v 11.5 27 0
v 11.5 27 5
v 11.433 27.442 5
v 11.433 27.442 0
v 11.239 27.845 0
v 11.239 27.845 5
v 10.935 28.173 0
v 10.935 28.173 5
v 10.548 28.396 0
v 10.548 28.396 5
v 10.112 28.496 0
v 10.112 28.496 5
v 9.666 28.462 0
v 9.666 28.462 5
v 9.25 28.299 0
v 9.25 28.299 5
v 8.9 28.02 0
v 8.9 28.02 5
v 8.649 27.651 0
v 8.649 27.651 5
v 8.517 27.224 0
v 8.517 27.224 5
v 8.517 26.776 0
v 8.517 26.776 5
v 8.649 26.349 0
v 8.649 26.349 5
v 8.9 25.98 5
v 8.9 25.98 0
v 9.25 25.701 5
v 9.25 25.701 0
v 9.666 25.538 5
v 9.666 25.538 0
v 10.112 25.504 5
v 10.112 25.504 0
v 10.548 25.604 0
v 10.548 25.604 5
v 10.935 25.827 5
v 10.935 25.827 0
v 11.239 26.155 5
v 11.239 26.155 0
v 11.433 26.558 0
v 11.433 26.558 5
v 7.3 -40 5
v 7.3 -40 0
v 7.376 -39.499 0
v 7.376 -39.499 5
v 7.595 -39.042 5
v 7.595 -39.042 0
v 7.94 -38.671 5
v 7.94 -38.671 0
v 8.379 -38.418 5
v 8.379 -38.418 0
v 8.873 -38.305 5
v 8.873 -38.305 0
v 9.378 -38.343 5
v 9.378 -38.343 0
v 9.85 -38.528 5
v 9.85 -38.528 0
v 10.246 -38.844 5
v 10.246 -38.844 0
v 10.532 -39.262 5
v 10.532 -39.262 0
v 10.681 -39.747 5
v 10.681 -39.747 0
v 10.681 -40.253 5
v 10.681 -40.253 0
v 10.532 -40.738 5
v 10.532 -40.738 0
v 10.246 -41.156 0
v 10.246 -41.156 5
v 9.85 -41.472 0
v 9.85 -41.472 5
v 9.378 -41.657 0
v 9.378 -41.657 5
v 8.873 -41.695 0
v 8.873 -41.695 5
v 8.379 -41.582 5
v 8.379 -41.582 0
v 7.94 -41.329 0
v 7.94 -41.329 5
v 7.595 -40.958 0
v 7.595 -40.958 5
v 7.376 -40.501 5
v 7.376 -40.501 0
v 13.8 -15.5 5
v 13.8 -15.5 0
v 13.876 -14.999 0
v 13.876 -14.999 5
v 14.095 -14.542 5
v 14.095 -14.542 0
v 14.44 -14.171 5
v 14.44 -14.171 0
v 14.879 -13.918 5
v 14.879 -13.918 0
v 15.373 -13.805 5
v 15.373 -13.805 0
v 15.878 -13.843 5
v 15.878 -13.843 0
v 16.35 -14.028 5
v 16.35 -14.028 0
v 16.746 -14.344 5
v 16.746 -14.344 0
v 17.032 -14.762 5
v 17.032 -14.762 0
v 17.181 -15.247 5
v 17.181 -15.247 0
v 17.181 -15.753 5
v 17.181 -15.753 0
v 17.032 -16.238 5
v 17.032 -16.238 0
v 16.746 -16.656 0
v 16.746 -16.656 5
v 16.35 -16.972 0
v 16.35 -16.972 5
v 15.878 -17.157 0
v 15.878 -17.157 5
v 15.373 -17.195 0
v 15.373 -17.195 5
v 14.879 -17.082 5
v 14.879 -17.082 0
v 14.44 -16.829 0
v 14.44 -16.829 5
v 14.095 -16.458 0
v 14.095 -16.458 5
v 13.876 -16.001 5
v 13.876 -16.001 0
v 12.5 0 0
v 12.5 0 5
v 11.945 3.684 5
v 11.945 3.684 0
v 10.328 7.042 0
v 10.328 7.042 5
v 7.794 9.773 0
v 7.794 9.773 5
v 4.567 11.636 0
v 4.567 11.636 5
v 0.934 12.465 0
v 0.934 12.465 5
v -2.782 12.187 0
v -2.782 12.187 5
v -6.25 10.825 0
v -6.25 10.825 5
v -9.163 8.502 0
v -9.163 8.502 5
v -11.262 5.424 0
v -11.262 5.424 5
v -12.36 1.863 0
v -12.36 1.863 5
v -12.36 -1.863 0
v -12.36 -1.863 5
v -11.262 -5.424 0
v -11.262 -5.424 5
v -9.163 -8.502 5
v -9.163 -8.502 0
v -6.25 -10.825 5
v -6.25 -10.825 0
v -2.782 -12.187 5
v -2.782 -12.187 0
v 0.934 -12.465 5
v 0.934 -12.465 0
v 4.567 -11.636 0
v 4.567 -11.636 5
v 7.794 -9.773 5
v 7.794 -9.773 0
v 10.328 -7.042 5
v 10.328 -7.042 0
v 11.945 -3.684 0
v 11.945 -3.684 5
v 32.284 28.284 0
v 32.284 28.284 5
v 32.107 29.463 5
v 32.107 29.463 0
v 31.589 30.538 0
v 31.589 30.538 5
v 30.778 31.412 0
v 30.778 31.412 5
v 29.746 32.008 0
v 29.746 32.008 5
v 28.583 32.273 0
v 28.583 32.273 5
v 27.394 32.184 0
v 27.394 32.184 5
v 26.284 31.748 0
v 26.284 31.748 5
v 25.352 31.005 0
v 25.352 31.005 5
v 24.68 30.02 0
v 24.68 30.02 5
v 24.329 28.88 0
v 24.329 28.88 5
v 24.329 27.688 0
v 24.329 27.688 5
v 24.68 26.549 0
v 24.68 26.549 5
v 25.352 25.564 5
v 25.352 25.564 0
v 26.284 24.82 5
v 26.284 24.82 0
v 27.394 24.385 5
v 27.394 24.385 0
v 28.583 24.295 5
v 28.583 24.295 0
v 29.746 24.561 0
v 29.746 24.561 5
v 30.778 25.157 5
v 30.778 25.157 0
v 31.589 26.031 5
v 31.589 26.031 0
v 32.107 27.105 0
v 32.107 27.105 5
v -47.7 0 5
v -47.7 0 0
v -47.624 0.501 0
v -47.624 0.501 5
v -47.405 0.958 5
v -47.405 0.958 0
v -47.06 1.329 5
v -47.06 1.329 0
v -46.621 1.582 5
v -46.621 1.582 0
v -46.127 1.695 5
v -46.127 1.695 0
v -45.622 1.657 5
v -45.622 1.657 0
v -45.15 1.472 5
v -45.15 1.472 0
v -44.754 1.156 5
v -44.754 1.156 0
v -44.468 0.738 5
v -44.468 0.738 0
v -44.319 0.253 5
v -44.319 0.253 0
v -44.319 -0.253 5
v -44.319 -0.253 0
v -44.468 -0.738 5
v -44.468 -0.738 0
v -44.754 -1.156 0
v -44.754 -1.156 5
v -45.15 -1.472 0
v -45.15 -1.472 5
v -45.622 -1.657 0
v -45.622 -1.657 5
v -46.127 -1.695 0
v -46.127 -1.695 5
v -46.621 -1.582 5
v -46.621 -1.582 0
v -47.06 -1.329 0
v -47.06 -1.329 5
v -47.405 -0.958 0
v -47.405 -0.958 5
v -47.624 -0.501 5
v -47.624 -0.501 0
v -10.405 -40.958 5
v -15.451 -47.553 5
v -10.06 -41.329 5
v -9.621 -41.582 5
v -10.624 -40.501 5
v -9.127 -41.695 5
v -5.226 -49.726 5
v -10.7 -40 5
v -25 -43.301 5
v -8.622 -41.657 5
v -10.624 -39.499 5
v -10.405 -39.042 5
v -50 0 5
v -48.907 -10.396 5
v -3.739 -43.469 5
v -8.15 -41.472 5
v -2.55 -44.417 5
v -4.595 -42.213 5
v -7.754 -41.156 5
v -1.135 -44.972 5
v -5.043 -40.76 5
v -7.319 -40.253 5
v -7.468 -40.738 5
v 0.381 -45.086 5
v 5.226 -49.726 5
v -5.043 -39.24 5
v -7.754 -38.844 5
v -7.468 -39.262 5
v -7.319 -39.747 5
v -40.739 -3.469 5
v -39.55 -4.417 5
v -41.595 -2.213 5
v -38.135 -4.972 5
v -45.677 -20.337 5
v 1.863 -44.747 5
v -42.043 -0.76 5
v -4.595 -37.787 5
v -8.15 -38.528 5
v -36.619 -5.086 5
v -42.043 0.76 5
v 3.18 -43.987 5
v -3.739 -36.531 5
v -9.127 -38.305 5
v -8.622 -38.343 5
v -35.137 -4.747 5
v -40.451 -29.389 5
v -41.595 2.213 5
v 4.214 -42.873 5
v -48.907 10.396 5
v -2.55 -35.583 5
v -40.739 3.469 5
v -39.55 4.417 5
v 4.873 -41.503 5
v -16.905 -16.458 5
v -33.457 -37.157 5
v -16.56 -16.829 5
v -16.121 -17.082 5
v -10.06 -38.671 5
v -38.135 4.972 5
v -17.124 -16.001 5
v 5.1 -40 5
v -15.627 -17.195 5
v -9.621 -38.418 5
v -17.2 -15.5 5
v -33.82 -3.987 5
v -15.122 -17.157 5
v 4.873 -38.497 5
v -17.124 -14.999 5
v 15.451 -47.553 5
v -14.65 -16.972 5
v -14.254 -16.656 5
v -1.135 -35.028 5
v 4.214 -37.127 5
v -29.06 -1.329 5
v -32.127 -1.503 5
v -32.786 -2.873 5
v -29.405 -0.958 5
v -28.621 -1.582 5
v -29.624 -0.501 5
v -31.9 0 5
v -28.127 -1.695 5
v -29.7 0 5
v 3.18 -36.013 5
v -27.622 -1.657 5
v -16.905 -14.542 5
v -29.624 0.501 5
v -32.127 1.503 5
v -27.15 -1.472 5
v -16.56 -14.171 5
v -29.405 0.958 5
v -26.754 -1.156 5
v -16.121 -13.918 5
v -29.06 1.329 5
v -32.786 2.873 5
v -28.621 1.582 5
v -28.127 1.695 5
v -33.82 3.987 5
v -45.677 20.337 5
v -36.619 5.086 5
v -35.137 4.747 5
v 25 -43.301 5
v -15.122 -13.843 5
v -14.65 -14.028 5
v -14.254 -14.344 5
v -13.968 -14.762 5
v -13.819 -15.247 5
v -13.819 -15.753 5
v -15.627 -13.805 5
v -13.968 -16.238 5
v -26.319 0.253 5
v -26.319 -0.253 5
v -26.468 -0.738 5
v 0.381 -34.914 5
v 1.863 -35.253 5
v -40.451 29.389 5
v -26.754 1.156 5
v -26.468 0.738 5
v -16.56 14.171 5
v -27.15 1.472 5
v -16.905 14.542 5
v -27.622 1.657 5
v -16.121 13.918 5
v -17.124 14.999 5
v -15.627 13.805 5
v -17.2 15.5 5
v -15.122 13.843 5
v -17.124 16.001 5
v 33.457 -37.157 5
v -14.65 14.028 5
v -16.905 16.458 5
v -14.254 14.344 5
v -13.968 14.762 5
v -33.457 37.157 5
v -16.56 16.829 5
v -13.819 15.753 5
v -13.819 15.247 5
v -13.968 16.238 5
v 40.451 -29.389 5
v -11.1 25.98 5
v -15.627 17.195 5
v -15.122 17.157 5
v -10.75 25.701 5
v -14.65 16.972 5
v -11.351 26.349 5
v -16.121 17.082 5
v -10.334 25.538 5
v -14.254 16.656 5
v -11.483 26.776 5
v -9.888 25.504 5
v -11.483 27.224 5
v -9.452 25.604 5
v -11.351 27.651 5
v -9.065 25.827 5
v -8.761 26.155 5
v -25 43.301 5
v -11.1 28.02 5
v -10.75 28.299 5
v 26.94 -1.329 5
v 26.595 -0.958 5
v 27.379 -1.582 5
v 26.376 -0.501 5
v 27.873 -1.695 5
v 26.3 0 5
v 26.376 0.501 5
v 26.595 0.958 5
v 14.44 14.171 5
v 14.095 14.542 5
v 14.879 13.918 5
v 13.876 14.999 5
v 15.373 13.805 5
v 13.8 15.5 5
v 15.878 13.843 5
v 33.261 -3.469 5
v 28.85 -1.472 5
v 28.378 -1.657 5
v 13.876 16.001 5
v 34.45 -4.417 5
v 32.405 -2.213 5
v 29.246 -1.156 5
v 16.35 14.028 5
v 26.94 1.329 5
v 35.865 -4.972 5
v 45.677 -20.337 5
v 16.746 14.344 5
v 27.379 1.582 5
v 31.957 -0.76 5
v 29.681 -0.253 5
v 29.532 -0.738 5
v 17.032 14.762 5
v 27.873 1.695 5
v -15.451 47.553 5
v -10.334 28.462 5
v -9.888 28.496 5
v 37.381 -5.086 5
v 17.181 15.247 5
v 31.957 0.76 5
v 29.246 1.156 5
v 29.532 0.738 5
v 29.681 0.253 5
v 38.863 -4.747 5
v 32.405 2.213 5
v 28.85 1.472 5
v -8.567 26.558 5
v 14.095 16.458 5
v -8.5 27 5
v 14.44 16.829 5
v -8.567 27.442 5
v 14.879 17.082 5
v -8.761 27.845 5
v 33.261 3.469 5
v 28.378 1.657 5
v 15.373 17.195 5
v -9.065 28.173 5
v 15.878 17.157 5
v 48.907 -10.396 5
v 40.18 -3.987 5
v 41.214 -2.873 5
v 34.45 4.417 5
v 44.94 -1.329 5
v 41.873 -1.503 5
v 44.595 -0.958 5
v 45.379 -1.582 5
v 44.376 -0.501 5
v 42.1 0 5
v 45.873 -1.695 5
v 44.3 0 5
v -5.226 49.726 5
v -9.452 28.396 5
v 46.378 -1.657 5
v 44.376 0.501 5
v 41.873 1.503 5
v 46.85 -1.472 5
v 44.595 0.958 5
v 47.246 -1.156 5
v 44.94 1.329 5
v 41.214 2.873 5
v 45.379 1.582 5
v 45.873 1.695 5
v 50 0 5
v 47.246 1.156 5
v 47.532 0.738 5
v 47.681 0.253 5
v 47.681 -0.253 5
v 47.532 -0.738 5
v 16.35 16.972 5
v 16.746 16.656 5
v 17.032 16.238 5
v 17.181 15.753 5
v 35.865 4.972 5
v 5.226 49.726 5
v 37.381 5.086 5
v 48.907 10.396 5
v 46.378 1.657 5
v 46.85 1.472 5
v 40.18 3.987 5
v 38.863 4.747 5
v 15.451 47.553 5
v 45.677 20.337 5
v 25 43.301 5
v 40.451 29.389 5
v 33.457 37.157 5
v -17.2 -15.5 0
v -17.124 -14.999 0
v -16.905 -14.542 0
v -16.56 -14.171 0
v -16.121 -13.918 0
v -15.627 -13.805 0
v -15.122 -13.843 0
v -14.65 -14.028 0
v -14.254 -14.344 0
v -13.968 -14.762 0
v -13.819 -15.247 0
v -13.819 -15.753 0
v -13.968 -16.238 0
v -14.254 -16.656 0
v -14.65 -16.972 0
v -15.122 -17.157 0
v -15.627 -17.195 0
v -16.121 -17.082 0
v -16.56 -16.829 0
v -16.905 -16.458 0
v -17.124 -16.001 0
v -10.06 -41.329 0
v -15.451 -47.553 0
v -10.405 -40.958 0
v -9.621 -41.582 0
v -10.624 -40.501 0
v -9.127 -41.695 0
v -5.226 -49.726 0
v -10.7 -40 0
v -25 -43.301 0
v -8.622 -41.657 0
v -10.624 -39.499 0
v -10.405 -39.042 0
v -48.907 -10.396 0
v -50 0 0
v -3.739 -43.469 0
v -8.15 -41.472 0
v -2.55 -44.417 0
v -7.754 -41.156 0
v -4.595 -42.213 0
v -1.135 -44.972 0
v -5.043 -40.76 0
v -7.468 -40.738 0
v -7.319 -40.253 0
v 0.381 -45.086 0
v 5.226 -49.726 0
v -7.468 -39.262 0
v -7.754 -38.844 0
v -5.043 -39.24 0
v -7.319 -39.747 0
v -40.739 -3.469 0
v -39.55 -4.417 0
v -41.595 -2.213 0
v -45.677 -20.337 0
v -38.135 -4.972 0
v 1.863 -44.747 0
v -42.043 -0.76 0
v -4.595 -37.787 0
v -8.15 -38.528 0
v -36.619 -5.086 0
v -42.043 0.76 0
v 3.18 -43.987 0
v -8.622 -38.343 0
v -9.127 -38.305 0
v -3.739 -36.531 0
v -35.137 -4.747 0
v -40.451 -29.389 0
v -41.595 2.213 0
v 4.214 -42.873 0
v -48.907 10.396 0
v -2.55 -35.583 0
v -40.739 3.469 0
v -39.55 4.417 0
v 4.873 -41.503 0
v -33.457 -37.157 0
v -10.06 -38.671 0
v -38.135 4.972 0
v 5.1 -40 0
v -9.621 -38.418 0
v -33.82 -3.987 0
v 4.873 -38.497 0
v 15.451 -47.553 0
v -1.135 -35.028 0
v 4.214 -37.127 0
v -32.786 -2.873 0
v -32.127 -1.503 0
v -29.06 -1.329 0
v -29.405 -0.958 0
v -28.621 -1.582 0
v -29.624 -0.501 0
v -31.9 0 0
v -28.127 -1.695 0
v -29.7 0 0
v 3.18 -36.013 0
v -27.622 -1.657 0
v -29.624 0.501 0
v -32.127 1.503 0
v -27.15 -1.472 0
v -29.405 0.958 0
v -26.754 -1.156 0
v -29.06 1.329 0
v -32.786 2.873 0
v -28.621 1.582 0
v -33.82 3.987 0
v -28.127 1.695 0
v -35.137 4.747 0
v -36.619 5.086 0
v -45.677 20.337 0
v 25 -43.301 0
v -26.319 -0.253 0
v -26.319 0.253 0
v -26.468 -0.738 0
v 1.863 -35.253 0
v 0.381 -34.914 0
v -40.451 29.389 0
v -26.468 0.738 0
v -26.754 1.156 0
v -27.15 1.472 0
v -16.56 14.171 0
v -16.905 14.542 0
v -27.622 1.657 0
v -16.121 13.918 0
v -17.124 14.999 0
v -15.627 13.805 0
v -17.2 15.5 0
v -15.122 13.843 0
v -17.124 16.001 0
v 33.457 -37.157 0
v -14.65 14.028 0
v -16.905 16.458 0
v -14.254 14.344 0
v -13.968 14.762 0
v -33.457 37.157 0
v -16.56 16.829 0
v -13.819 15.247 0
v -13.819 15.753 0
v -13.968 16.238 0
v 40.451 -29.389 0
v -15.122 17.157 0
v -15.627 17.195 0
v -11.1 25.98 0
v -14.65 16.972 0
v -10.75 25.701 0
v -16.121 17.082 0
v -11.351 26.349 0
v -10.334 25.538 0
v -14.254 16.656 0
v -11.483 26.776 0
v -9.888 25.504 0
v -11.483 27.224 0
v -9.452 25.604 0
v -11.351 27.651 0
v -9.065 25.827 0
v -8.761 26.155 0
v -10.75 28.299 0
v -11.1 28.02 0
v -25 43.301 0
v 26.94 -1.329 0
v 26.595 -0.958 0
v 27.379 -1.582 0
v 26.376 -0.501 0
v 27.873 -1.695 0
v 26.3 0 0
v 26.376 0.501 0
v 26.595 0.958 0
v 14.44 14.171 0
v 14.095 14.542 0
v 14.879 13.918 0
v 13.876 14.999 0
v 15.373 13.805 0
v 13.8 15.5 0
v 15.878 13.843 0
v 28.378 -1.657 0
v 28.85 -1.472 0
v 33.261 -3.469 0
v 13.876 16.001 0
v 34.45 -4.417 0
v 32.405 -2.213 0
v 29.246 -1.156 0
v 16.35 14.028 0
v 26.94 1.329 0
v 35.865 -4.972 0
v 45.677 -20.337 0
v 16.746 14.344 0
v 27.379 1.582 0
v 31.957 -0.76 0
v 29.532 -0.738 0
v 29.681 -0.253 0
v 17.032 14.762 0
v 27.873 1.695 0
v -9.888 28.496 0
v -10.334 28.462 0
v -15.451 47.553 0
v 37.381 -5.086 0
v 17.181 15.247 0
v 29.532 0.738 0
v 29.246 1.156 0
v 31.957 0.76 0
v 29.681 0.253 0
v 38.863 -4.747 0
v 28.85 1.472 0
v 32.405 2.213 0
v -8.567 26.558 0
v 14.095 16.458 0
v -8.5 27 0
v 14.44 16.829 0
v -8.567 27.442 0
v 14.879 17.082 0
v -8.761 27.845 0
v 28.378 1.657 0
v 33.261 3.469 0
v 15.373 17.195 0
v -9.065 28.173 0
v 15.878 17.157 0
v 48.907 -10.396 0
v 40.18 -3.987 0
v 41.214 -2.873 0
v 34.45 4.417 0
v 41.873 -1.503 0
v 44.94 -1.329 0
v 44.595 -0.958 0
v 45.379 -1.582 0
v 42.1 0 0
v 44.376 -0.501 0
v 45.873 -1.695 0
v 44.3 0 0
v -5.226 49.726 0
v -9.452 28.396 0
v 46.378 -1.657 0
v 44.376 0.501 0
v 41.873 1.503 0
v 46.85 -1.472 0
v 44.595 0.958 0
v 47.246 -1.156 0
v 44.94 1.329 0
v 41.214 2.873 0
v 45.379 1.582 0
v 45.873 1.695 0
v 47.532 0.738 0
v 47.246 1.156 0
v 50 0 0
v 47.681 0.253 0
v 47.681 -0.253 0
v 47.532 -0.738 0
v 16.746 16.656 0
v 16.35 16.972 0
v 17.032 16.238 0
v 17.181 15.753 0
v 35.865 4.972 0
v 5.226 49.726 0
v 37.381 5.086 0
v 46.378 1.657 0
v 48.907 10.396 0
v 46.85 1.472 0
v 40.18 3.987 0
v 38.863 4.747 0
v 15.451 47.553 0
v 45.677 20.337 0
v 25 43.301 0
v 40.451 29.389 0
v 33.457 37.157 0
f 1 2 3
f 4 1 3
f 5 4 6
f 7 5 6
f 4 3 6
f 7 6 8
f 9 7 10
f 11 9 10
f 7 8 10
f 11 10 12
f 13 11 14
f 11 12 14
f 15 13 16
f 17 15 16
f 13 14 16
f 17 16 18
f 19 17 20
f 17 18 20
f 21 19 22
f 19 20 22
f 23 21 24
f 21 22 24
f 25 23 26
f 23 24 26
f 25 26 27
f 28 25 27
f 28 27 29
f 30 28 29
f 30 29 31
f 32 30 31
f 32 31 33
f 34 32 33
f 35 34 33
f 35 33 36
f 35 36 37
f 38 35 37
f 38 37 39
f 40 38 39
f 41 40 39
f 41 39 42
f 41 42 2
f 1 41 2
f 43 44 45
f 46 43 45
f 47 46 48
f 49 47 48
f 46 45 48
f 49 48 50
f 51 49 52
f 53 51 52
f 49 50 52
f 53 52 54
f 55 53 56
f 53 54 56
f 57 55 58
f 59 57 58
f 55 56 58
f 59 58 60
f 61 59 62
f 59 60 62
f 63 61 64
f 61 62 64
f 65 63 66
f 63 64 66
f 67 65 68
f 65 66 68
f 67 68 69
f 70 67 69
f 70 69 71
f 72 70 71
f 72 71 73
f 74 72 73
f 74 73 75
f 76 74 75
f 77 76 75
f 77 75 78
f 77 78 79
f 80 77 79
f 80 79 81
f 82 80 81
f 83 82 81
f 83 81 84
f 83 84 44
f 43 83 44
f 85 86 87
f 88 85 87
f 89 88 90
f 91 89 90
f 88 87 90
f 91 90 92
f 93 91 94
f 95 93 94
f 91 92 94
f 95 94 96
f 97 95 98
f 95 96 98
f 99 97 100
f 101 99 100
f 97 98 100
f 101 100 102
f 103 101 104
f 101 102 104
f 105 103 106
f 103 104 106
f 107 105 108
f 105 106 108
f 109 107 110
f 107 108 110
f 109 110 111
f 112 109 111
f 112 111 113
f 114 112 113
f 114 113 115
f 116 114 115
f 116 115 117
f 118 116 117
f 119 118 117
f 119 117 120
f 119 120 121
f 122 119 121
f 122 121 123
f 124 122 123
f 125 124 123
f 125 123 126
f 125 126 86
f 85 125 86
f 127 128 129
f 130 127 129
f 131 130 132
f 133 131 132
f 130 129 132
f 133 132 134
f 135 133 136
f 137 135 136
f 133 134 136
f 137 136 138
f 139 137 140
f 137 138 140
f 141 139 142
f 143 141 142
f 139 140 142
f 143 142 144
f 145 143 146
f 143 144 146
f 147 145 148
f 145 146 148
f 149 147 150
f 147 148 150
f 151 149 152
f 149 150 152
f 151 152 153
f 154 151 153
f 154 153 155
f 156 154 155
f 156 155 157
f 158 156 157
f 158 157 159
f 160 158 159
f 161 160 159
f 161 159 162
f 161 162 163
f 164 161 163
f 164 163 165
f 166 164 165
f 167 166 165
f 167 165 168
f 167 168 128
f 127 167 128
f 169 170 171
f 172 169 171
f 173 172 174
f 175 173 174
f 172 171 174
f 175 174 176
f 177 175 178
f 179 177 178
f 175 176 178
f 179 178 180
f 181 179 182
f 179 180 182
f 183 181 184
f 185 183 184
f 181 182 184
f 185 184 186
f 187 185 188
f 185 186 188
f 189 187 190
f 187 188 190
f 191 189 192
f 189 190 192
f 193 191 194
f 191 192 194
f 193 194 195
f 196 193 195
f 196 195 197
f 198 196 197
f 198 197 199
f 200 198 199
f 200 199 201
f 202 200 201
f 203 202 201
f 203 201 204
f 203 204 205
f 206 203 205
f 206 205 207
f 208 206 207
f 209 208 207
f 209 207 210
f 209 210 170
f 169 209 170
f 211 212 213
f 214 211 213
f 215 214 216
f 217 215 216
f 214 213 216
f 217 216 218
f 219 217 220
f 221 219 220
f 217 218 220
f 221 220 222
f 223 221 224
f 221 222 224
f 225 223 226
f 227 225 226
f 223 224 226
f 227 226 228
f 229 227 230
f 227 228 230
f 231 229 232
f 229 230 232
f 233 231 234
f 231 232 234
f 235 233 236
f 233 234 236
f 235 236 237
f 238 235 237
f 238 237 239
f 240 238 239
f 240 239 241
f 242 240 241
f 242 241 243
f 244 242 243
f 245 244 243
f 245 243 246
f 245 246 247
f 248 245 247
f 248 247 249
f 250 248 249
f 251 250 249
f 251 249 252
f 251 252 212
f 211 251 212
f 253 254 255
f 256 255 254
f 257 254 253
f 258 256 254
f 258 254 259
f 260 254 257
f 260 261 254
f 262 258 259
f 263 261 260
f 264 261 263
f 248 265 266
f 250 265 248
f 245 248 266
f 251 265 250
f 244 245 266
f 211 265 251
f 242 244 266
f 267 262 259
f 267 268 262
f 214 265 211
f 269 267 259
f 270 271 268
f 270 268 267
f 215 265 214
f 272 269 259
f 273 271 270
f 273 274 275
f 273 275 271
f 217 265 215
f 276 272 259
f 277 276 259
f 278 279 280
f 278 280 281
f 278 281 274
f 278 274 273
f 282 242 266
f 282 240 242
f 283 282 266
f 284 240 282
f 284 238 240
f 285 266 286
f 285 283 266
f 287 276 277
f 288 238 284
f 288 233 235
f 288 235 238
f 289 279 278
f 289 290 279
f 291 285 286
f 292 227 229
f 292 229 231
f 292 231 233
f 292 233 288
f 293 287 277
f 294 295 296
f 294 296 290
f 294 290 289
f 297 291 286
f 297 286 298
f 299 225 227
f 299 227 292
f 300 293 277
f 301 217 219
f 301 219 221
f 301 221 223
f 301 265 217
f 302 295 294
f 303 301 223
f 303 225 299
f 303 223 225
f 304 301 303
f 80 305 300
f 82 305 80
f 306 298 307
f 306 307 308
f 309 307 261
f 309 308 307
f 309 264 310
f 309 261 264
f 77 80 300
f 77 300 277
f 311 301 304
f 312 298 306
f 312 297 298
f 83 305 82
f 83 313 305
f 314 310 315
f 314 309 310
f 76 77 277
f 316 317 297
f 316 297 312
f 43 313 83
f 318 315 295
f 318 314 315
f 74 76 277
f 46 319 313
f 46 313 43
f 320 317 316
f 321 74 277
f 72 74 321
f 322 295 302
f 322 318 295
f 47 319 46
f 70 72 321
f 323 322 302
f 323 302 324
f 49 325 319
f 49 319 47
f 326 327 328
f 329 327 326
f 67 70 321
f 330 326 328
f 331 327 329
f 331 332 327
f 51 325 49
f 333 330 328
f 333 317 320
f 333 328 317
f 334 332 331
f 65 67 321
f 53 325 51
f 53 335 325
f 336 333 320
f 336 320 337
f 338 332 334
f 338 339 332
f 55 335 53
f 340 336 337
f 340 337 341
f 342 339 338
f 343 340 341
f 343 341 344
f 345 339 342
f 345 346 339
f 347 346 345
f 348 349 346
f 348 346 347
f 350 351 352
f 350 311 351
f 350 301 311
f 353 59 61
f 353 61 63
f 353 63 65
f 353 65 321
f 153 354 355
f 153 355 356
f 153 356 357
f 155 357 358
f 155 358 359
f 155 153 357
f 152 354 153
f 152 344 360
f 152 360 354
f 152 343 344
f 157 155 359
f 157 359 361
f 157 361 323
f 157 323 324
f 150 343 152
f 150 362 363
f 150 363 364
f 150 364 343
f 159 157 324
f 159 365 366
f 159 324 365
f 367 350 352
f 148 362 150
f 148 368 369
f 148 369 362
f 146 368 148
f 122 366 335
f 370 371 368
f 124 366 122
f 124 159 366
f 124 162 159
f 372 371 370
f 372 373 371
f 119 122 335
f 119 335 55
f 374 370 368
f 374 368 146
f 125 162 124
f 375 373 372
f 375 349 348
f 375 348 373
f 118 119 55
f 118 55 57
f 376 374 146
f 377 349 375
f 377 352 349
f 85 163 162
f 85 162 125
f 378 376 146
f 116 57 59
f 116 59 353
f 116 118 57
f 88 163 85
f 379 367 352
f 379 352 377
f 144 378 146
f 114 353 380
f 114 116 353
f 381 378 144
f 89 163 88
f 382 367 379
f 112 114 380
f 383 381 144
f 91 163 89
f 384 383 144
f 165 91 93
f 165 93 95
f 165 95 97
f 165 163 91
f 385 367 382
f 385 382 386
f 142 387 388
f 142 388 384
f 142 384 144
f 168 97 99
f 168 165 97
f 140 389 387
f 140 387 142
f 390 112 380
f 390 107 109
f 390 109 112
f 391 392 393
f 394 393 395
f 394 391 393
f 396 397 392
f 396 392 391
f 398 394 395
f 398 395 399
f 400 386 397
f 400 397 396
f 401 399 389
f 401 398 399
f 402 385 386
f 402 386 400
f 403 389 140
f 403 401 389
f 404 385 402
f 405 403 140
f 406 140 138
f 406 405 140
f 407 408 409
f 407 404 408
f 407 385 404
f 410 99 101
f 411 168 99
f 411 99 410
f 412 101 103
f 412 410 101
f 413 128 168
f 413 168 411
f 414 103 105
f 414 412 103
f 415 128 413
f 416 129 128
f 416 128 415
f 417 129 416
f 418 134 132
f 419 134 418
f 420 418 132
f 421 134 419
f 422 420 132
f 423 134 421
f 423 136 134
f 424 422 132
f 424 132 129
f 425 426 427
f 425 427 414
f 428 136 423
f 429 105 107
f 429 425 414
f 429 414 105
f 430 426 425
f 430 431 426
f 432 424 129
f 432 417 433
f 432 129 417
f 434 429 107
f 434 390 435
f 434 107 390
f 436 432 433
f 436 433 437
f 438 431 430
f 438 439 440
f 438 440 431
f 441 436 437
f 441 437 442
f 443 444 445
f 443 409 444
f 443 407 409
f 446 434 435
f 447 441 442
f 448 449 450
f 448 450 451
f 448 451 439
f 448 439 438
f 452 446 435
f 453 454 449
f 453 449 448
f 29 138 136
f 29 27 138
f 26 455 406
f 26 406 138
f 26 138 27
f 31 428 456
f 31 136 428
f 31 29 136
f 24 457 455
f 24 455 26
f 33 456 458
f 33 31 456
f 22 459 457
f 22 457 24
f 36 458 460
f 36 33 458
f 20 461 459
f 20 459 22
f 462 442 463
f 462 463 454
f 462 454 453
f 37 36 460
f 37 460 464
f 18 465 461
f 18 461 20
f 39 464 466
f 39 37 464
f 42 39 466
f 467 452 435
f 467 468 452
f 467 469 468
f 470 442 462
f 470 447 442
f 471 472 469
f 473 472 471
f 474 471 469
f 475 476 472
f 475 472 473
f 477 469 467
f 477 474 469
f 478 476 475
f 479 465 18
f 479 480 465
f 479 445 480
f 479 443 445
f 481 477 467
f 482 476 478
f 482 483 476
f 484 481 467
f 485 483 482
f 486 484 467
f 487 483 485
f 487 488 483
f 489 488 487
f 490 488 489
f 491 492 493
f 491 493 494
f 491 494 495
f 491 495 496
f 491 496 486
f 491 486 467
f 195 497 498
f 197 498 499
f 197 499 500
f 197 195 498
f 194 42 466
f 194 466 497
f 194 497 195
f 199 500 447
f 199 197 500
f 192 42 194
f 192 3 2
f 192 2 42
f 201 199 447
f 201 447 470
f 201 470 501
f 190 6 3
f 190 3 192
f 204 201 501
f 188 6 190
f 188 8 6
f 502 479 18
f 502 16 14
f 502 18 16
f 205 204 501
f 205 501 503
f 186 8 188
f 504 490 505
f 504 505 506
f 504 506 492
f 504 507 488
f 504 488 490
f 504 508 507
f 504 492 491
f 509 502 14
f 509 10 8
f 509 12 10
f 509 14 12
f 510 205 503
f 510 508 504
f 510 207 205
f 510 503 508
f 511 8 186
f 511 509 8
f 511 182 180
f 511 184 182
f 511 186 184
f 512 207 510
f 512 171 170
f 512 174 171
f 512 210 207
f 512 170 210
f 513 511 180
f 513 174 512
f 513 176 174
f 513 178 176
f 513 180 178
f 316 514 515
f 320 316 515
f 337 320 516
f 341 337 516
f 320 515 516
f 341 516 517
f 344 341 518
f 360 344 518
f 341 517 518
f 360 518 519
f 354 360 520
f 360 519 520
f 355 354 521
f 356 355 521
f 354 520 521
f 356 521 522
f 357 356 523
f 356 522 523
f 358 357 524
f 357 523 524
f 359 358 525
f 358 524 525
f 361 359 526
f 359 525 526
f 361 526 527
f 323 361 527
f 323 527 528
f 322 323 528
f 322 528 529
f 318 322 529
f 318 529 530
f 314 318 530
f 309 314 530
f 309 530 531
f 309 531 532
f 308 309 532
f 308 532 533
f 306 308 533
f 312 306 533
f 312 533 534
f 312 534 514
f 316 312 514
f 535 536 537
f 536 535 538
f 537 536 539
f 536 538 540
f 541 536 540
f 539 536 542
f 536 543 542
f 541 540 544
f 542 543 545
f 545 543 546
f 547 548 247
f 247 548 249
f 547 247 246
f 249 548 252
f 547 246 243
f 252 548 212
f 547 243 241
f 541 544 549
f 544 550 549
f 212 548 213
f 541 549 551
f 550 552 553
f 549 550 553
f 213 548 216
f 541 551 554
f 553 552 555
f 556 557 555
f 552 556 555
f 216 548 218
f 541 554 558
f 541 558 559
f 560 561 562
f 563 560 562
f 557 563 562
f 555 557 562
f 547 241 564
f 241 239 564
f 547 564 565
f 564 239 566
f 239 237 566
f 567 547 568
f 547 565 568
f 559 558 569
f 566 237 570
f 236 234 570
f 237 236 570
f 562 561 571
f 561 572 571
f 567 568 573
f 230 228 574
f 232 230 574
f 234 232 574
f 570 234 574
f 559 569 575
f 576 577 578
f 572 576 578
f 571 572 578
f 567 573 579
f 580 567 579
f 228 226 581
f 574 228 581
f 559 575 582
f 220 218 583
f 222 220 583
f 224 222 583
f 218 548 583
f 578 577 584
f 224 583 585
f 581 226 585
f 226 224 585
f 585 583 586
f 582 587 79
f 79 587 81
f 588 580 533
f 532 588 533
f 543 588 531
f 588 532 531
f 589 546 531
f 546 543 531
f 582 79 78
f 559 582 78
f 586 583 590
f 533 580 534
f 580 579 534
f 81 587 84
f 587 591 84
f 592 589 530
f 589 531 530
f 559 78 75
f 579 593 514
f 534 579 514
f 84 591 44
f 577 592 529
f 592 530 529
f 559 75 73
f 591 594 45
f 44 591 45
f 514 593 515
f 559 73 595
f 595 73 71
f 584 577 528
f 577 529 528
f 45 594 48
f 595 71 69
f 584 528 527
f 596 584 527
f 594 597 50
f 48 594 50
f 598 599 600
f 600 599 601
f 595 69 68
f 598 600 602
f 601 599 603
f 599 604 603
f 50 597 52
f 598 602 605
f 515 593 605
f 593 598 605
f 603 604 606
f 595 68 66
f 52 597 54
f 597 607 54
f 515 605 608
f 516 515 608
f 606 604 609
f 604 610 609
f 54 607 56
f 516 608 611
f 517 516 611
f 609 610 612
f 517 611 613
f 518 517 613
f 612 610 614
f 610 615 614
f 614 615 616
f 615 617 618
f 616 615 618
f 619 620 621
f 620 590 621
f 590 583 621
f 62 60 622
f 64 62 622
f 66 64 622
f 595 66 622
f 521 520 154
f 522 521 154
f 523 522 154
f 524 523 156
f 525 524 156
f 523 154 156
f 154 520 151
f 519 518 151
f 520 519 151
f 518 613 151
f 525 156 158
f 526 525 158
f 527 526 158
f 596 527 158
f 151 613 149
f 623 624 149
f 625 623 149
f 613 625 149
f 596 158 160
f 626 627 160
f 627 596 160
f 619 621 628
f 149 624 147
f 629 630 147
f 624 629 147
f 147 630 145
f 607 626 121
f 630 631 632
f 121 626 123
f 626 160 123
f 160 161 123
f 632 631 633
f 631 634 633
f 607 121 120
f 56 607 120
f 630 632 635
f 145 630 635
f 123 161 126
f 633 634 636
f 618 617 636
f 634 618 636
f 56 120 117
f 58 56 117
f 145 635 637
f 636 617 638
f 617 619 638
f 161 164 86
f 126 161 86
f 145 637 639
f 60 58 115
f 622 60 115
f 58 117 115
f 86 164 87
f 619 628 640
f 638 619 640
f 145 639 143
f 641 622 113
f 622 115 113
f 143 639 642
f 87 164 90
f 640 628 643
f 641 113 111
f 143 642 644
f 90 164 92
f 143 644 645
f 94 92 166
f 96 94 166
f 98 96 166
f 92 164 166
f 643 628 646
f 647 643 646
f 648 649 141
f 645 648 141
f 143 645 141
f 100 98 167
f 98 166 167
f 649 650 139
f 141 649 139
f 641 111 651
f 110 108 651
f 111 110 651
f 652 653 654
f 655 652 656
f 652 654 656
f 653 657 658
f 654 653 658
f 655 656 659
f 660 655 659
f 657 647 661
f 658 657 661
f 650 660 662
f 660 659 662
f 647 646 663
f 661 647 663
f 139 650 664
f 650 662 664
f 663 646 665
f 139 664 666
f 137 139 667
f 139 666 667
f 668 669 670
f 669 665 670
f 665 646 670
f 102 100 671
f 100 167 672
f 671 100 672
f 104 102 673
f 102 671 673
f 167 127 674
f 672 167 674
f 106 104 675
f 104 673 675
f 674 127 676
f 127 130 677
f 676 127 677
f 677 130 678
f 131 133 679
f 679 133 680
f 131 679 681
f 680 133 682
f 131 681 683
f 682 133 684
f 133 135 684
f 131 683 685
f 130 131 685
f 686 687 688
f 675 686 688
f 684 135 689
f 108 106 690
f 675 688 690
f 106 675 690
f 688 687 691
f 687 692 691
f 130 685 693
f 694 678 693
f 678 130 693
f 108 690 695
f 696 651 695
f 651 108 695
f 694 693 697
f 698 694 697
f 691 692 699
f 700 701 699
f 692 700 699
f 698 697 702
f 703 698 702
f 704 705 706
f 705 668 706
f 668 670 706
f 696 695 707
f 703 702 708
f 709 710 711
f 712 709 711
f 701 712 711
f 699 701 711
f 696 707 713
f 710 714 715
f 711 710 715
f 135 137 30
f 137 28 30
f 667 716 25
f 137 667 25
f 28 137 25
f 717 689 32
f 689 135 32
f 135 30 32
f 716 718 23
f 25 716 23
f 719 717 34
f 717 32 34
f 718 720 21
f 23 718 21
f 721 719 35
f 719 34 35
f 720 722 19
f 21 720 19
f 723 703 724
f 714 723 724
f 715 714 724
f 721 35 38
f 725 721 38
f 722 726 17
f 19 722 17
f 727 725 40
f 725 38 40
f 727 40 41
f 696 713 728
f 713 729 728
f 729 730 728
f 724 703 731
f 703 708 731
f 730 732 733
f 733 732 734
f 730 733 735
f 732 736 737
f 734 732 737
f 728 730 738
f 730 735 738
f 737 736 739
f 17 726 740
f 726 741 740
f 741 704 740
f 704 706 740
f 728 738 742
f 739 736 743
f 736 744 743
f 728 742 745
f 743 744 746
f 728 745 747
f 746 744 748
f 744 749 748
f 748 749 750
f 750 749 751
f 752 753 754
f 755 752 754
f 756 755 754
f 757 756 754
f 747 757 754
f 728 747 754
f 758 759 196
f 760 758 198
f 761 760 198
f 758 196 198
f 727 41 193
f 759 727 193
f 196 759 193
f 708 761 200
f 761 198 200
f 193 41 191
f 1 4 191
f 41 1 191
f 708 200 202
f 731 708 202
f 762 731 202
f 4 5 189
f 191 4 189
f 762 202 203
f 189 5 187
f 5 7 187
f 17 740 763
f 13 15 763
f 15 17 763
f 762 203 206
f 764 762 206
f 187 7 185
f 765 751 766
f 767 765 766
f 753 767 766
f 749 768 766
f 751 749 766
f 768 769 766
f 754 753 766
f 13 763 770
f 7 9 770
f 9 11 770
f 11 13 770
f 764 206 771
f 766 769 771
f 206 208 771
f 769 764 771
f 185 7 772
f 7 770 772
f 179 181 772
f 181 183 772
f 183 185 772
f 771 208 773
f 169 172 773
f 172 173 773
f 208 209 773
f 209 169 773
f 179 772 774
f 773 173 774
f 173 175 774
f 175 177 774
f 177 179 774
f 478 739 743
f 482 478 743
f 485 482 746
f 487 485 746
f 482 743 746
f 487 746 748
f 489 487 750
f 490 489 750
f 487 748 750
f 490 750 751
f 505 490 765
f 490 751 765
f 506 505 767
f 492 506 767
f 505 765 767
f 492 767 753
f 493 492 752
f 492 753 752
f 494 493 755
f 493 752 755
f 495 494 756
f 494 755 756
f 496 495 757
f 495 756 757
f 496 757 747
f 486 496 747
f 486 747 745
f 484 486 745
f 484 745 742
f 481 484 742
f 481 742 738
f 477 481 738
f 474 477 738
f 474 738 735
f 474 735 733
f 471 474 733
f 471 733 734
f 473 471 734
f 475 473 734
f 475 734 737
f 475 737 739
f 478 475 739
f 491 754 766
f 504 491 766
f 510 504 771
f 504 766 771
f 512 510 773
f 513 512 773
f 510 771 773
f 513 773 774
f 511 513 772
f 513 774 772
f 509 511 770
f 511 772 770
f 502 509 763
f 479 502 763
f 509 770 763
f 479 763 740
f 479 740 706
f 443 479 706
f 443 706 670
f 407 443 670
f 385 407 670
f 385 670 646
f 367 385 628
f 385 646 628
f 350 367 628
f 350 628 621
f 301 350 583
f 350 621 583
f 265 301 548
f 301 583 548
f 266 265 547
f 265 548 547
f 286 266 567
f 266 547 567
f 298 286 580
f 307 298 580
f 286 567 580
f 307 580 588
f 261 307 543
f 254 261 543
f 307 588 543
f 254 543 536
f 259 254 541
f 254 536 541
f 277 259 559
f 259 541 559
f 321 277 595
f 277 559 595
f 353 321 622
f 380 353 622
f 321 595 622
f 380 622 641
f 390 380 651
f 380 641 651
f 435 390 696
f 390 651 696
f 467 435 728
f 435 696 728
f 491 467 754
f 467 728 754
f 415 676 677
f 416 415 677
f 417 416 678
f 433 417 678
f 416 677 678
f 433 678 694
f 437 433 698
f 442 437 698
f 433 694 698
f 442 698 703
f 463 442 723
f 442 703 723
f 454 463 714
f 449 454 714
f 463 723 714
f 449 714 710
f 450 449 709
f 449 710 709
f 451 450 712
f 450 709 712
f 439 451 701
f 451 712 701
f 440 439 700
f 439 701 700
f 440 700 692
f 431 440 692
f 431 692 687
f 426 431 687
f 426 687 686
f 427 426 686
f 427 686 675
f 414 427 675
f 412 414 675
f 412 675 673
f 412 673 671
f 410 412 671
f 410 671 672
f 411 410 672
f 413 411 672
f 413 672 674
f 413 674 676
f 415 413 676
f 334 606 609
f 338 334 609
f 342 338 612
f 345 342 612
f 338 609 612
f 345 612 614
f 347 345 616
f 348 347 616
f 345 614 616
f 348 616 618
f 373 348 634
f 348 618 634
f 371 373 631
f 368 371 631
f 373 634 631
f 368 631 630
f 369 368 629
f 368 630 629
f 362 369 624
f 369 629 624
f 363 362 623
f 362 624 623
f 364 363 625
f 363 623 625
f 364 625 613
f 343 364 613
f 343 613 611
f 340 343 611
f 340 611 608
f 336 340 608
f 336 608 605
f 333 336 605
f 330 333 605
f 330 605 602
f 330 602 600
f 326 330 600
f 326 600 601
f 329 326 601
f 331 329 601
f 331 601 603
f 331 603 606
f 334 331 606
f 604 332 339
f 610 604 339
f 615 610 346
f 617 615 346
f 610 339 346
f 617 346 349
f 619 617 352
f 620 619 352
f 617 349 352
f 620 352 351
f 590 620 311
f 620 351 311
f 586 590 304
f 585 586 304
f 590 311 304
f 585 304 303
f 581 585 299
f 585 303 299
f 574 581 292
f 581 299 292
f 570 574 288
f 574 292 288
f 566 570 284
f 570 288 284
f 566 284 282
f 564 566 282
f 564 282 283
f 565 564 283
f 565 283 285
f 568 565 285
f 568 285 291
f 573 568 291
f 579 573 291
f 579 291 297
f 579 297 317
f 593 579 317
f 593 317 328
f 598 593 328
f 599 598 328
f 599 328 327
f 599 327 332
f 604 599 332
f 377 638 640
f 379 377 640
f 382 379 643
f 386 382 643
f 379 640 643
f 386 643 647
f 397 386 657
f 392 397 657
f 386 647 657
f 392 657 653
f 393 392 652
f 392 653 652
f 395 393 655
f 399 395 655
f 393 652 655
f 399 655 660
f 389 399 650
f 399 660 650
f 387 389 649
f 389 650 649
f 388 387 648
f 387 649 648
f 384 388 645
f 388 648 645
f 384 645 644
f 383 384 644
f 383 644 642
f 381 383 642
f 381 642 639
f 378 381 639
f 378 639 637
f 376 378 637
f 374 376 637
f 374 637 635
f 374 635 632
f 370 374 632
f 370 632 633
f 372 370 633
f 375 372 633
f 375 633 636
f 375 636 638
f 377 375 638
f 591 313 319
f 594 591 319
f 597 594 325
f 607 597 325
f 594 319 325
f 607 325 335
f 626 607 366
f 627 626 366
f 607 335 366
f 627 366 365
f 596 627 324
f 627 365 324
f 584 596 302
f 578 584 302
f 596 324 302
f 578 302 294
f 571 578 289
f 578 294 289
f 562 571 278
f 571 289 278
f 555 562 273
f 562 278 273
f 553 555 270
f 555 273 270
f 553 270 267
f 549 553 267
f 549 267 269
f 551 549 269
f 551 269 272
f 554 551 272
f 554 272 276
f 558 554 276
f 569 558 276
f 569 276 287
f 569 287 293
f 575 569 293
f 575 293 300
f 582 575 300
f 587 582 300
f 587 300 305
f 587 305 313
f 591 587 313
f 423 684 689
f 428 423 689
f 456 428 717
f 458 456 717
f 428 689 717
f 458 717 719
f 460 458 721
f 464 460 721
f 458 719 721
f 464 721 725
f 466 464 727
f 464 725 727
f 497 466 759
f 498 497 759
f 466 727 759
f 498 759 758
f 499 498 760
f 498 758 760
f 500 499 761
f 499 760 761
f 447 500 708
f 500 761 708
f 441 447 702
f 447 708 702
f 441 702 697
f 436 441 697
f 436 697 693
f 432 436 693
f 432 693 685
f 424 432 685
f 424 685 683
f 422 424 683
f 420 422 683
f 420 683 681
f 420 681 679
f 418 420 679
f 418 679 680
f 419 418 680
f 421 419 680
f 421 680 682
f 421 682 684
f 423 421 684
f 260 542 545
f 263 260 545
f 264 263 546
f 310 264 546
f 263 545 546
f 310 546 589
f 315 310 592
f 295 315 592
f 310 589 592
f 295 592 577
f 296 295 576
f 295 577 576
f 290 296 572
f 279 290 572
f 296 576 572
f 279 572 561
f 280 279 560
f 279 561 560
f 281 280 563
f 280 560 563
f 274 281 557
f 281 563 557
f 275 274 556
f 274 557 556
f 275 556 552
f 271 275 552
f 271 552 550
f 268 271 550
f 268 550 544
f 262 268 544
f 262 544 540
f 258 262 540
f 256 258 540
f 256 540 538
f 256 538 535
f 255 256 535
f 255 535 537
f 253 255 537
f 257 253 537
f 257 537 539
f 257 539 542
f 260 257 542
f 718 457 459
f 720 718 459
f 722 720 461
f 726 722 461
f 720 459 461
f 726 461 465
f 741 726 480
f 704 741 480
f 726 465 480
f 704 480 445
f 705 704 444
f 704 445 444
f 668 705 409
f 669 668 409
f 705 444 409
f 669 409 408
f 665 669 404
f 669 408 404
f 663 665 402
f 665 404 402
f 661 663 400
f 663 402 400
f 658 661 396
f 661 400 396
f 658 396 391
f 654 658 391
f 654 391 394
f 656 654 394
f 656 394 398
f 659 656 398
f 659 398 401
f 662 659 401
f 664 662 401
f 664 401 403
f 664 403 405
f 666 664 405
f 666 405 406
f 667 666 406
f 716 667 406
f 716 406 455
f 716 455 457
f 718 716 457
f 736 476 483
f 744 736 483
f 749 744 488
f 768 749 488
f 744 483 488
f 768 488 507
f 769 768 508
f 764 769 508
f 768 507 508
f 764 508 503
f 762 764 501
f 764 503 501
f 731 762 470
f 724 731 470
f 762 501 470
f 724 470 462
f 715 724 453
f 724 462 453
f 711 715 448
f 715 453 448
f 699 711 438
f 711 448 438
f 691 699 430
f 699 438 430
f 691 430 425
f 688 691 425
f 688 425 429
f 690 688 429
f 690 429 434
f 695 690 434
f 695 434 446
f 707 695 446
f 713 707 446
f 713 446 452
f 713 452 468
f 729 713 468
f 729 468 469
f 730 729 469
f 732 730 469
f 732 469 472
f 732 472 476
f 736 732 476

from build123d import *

# Parameters (mm, degrees)
SKETCH1_R                    = 50
BOSS_EXTRUDE1_DEPTH          = 5
F_25_0_25_DIAMETER_HOLE1_D   = 25
F_10_2_10_2_DIAMETER_HOLE1_D = 10.2
M3_CLEARANCE_HOLE1_D         = 3.4
M3_CLEARANCE_HOLE2_D         = 3.4
SKETCH11_R                   = 1.5
CUT_EXTRUDE1_DEPTH           = 10
SKETCH12_R                   = 4
CUT_EXTRUDE2_DEPTH           = 10


with BuildPart() as part:
    # Sketch1 → Boss-Extrude1 (new body)
    with BuildSketch(Plane.XY):
        Circle(SKETCH1_R)
    extrude(amount=BOSS_EXTRUDE1_DEPTH)

    # Ø25.0 (25) Diameter Hole1 (through all)
    with Locations(Plane(origin=(0, 0, 0), x_dir=(-1, 0, 0), z_dir=(0, 0, -1))):
        with Locations((0, 0)):
            Hole(F_25_0_25_DIAMETER_HOLE1_D / 2)

    # Ø10.2 (10.2) Diameter Hole1 (through all)
    with Locations(Plane(origin=(0, 0, 0), x_dir=(-1, 0, 0), z_dir=(0, 0, -1))):
        with Locations((37, 0), (-37, 0), (0, -40)):
            Hole(F_10_2_10_2_DIAMETER_HOLE1_D / 2)

    # M3 Clearance Hole1 (through all)
    with Locations(Plane.XY.offset(5)):
        with Locations((46, 0), (28, 0), (9, -40), (-9, -40), (-46, 0), (-28, 0)):
            Hole(M3_CLEARANCE_HOLE1_D / 2)

    # M3 Clearance Hole2 (through all)
    with Locations(Plane.XY.offset(5)):
        with Locations((15.5, 15.5), (15.5, -15.5), (-15.5, -15.5), (-15.5, 15.5)):
            Hole(M3_CLEARANCE_HOLE2_D / 2)

    # Sketch11 → Cut-Extrude1 (cut)
    with BuildSketch(Plane.XY.offset(5)):
        with Locations((-10, 27)):
            Circle(SKETCH11_R)
        with Locations((10, 27)):
            Circle(SKETCH11_R)
    extrude(amount=-CUT_EXTRUDE1_DEPTH, mode=Mode.SUBTRACT)

    # Sketch12 → Cut-Extrude2 (cut)
    with BuildSketch(Plane.XY.offset(5)):
        with Locations((28.284271247, 28.284271247)):
            Circle(SKETCH12_R)
    extrude(amount=-CUT_EXTRUDE2_DEPTH, mode=Mode.SUBTRACT)


solid = part.part
